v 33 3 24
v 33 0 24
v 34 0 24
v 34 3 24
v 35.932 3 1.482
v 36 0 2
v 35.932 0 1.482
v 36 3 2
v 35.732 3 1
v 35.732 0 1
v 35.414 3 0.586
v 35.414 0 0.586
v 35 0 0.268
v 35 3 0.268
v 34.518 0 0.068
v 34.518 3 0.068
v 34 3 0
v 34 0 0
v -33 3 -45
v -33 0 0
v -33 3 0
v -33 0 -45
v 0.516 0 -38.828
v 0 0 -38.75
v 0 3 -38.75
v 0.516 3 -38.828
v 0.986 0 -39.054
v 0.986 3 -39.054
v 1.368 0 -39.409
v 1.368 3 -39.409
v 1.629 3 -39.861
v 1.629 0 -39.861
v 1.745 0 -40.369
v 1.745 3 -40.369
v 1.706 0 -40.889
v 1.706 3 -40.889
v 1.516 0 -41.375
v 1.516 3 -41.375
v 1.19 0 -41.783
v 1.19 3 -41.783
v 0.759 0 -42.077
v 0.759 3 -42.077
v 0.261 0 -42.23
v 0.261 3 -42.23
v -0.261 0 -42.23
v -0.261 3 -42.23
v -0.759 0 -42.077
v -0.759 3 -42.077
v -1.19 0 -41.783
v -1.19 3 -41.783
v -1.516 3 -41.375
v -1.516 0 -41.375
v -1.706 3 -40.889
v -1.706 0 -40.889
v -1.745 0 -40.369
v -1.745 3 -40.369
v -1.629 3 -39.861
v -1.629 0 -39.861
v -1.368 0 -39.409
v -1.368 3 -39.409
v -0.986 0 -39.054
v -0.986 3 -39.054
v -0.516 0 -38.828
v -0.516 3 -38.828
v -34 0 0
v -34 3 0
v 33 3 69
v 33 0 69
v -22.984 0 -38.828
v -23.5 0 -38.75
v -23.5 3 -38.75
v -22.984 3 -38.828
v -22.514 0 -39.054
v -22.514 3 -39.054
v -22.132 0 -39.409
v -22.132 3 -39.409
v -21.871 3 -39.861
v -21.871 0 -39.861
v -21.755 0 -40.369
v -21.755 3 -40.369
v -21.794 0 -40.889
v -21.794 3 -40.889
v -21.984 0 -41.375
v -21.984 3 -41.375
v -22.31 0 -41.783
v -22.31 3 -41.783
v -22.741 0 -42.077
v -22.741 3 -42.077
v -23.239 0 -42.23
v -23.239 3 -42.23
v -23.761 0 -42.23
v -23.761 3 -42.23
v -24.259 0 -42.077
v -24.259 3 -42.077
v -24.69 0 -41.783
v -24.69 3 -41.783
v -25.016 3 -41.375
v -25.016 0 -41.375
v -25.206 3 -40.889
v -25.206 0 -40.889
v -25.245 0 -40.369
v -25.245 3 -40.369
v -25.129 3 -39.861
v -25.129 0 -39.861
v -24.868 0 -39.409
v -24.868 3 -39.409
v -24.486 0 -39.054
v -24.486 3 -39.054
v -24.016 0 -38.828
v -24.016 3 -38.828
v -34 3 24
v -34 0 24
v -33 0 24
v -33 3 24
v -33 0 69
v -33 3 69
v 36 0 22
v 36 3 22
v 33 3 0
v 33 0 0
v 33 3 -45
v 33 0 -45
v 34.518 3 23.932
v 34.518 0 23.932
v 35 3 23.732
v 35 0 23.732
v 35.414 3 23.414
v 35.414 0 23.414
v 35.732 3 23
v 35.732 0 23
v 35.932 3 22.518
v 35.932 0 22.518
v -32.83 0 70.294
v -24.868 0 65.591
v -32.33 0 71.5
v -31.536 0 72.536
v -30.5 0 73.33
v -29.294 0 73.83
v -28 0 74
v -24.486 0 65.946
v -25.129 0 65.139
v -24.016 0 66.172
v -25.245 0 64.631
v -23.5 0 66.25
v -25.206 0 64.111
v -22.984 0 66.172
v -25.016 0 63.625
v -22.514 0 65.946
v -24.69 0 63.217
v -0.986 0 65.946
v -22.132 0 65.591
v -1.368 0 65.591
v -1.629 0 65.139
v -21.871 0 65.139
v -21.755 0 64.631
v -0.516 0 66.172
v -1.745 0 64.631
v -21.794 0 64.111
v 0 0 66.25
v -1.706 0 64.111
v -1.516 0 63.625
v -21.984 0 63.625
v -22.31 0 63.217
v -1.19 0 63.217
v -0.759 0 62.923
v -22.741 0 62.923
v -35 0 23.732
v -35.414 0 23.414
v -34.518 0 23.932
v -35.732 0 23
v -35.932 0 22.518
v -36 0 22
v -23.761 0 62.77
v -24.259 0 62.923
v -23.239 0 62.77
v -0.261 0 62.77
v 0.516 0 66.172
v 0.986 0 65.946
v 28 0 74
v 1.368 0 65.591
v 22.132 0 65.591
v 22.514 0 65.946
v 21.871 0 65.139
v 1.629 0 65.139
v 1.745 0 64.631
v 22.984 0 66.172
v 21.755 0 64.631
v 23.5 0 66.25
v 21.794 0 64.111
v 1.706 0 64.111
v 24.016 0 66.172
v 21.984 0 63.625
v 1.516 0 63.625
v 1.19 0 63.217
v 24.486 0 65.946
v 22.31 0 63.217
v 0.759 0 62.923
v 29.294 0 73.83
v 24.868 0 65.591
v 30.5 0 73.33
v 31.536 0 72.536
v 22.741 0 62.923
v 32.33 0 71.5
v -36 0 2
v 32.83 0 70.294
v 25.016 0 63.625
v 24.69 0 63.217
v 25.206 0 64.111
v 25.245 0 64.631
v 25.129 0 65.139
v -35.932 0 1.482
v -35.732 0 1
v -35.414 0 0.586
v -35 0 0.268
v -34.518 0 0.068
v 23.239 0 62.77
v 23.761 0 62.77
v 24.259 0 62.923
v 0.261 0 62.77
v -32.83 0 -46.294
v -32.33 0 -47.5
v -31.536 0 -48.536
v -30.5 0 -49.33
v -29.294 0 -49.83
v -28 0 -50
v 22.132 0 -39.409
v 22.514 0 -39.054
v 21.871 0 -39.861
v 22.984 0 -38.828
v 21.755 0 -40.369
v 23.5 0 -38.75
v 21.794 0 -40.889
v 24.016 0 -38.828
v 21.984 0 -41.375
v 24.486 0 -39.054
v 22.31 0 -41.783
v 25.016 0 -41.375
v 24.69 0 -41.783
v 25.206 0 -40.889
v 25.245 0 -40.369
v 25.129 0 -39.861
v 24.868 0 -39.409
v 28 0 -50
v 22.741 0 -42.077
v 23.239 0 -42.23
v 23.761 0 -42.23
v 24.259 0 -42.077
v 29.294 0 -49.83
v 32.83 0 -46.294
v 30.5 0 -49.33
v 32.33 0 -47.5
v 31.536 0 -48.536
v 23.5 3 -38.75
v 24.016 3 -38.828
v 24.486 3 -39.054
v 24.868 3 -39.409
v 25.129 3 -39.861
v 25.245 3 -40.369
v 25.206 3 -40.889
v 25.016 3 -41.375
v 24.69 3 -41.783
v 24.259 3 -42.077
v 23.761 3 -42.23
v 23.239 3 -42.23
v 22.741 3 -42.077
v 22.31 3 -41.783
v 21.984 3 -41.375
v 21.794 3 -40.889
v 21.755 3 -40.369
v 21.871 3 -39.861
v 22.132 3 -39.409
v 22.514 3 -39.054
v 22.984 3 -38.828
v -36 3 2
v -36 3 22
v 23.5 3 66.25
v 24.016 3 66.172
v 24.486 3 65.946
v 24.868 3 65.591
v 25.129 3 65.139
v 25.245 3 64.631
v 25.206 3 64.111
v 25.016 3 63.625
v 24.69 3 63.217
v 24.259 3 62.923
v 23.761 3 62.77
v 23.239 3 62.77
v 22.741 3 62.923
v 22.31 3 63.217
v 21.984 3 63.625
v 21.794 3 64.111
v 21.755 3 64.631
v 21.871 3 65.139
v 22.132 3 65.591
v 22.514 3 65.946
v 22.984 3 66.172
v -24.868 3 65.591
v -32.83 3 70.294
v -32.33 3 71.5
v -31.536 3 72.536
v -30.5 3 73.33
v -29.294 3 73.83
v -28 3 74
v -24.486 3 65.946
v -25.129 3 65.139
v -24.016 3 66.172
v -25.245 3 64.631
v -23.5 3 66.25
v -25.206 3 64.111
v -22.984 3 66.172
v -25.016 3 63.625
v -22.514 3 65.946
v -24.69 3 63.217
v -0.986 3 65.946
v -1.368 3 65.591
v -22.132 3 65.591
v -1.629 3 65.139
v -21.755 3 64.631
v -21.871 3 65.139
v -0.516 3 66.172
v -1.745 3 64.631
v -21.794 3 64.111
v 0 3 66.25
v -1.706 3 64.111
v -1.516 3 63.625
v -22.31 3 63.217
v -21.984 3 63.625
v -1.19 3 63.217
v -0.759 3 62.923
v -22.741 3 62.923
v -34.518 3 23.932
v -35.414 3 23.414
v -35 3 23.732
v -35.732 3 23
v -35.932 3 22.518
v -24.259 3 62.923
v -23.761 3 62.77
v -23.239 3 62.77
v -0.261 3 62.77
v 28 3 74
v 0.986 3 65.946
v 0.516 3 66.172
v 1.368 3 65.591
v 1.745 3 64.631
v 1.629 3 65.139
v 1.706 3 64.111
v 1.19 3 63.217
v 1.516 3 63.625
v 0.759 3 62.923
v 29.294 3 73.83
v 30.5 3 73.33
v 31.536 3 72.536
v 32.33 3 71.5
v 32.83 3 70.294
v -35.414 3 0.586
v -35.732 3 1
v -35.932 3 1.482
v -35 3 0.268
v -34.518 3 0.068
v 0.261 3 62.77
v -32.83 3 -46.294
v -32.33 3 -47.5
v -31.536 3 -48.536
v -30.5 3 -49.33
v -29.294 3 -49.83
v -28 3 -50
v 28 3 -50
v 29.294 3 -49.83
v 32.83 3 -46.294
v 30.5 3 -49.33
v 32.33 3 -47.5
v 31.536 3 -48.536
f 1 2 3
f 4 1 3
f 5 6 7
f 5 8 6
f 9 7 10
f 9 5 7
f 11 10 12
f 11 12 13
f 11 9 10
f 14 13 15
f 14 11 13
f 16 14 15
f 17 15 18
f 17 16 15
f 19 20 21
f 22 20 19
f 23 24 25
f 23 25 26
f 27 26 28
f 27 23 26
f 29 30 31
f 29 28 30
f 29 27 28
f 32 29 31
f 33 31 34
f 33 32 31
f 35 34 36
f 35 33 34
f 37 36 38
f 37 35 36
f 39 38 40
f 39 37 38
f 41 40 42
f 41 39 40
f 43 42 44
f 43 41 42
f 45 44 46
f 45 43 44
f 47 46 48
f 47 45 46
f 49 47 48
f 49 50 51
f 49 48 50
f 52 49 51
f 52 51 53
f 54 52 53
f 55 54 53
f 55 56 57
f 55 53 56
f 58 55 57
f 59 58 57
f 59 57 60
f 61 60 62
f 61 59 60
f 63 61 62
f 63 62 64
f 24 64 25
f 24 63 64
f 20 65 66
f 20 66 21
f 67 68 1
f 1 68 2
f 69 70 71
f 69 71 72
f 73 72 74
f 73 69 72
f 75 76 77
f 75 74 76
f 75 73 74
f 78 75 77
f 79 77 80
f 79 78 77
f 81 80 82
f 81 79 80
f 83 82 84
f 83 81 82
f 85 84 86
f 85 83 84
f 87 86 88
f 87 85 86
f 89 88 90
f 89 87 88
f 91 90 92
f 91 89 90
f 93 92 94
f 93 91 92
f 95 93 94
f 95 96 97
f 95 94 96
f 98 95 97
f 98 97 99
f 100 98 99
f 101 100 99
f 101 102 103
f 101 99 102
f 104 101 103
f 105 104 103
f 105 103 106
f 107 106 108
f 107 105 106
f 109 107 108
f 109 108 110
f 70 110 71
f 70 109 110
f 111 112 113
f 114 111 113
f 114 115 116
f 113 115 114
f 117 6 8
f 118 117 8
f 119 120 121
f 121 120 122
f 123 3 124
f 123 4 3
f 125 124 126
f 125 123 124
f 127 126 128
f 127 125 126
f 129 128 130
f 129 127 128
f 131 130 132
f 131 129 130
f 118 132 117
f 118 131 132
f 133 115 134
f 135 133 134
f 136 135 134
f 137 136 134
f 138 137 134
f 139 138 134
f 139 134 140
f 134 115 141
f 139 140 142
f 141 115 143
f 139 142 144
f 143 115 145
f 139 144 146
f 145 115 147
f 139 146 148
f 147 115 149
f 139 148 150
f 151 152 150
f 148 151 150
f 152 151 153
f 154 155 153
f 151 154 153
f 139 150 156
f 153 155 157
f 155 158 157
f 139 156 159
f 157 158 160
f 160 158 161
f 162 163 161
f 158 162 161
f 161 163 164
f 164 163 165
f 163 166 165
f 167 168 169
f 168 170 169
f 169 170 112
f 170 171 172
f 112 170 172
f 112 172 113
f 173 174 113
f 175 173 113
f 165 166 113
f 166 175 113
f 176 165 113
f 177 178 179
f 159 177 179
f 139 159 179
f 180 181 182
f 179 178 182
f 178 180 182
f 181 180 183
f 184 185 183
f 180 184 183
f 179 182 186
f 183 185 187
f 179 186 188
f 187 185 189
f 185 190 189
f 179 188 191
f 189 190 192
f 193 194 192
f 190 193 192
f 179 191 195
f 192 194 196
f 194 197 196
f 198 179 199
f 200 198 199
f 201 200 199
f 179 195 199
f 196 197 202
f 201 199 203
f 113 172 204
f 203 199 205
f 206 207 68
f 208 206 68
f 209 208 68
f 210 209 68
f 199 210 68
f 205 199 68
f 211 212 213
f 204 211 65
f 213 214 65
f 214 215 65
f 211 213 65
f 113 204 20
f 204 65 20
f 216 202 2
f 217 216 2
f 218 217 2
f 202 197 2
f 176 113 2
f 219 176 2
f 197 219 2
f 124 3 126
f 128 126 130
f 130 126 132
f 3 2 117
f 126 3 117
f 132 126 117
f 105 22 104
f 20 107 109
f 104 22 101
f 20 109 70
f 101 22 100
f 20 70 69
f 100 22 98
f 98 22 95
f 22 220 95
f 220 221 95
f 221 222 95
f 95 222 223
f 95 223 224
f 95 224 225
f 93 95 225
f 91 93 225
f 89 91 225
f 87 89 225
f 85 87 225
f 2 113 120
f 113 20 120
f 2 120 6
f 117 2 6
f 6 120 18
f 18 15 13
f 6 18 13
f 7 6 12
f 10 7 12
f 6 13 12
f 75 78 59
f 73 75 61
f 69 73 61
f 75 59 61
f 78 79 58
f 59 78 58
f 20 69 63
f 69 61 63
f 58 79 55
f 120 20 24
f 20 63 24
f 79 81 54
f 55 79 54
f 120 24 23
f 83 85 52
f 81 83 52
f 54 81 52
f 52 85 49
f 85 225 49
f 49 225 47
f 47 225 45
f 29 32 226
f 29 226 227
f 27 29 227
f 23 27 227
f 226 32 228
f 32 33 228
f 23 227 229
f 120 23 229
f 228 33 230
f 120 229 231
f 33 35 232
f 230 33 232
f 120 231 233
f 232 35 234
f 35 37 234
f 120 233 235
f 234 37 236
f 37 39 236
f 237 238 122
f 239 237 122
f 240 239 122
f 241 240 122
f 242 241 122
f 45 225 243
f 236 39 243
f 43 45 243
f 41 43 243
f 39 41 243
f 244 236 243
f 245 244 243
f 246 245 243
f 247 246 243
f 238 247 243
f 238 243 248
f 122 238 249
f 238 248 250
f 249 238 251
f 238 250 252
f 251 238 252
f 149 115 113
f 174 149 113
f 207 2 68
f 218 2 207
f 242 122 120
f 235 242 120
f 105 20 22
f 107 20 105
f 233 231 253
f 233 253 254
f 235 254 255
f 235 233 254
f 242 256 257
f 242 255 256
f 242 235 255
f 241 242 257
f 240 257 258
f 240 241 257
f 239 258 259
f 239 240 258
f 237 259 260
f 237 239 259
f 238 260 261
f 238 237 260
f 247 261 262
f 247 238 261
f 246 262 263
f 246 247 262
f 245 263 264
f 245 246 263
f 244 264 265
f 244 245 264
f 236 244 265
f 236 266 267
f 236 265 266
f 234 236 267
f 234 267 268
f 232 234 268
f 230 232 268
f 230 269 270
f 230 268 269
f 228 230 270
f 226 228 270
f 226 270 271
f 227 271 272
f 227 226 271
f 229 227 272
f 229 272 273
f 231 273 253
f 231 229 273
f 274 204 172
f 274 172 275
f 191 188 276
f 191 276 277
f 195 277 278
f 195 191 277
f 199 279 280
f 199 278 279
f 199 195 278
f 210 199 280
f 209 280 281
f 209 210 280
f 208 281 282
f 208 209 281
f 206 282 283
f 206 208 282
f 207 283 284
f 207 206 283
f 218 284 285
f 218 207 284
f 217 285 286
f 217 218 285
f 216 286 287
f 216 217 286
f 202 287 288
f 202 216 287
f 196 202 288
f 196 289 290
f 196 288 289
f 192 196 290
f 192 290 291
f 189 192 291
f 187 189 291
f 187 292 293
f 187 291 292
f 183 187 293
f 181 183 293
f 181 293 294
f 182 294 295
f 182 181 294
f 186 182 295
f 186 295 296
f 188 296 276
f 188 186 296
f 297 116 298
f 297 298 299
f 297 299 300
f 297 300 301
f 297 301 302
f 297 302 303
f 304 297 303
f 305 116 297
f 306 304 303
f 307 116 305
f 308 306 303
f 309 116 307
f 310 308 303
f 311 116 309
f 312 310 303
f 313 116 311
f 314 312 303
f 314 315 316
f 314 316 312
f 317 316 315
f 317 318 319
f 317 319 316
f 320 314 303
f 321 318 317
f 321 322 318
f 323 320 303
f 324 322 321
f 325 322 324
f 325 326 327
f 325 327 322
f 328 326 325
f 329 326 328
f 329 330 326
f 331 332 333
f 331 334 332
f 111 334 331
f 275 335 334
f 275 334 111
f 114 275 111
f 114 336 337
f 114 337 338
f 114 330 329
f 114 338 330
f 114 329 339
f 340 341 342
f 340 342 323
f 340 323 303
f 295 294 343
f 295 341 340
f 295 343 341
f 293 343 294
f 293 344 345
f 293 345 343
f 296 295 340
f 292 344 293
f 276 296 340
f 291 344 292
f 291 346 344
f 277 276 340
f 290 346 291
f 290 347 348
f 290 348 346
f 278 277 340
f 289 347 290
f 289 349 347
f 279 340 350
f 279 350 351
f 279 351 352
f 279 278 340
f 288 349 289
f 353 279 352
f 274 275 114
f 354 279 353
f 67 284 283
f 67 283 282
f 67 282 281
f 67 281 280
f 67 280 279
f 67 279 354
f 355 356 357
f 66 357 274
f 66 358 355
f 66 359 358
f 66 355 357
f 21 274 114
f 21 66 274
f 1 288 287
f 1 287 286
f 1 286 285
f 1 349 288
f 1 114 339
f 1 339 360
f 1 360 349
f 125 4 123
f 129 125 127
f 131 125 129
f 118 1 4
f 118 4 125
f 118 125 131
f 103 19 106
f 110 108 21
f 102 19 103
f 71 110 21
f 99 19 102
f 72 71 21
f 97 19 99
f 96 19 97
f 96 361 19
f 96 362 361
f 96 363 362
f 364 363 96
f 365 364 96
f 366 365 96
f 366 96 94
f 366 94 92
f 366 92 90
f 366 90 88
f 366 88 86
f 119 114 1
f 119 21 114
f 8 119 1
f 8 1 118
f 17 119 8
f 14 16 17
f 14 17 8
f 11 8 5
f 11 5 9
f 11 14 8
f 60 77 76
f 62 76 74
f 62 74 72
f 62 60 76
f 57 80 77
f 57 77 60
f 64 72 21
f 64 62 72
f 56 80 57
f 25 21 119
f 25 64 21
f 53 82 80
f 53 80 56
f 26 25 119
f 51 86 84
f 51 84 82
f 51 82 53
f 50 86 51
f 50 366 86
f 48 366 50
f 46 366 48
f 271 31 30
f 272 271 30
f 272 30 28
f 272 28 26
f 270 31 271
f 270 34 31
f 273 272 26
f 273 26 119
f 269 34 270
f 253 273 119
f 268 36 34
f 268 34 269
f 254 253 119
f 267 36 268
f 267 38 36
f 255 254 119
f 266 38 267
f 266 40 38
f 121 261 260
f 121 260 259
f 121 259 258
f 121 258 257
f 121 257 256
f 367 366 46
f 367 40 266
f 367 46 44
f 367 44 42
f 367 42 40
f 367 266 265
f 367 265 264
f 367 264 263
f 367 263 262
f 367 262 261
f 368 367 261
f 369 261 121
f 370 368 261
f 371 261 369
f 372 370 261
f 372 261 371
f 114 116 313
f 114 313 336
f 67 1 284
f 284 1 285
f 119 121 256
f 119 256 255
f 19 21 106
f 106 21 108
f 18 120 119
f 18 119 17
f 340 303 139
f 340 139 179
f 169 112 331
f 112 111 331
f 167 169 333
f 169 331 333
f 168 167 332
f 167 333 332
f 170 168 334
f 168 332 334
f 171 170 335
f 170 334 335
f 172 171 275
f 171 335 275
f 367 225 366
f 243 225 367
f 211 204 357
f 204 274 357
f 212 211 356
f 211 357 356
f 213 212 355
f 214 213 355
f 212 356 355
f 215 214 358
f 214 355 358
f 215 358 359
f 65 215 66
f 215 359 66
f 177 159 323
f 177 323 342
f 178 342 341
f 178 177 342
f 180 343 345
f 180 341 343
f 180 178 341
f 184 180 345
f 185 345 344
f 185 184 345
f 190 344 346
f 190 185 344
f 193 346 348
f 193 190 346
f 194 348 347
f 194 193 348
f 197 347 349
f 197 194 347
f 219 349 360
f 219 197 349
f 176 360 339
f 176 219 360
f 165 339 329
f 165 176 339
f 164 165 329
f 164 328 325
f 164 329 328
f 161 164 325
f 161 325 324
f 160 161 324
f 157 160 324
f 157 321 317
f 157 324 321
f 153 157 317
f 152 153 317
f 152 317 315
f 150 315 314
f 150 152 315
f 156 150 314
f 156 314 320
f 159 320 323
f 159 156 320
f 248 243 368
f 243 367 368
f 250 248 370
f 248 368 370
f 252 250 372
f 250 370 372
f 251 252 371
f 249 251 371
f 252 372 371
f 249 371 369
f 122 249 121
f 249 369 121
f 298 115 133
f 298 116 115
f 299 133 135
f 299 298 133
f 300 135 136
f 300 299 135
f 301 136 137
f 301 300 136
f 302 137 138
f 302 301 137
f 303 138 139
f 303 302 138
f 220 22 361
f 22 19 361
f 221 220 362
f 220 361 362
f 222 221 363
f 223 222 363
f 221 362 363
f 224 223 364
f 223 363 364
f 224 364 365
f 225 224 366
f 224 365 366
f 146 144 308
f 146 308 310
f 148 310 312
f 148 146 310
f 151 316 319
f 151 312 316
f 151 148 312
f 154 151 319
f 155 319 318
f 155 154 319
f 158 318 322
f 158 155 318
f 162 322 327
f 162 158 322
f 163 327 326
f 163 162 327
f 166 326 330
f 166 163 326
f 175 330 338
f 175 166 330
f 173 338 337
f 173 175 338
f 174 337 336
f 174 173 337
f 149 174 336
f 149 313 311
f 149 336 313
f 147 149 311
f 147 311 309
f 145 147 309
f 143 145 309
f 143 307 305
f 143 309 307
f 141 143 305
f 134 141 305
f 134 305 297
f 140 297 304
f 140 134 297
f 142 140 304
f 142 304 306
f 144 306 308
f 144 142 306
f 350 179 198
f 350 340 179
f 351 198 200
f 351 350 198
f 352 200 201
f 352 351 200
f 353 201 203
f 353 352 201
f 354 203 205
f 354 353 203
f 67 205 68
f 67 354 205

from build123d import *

# Parameters (mm, degrees)
SKETCH_1_W               = 72
SKETCH_1_H               = 100
EXTRUDE_1_DEPTH          = 3
SKETCH_2_W               = 72
SKETCH_2_H               = 3
EXTRUDE_2_DEPTH          = 24
CUT_EXTRUDE_1_DEPTH      = 83.346827504
CUT_EXTRUDE_1_DEPTH_BACK = 83.346827504
SKETCH_3_W               = 3
SKETCH_3_H               = 50
CUT_EXTRUDE_2_DEPTH      = 83.346827504
CUT_EXTRUDE_2_DEPTH_BACK = 83.346827504
SKETCH_5_R               = 1.75
CUT_EXTRUDE_3_DEPTH      = 83.346827504
CUT_EXTRUDE_3_DEPTH_BACK = 83.346827504
SKETCH_6_R               = 1.75
FILLET_1_R               = 5
FILLET_2_R               = 2
CUT_EXTRUDE_5_DEPTH      = 83.346827504
CUT_EXTRUDE_5_DEPTH_BACK = 83.346827504
SKETCH_8_R               = 1.75


with BuildPart() as part:
    # 草图1 → 凸台-拉伸1 (new body)
    with BuildSketch(Plane(origin=(0, 0, 0), x_dir=(1, 0, 0), z_dir=(0, 1, 0))):
        Rectangle(SKETCH_1_W, SKETCH_1_H)
    extrude(amount=EXTRUDE_1_DEPTH)

    # 草图2 → 凸台-拉伸2 (add)
    with BuildSketch(Plane.XY.offset(50)):
        with Locations((0, 1.5)):
            Rectangle(SKETCH_2_W, SKETCH_2_H)
    extrude(amount=EXTRUDE_2_DEPTH)

    # 草图3 → 切除-拉伸1 (cut, two sides: drawn at the far end of the back side and taken through both)
    with BuildSketch(Plane(origin=(0, 3, 0), x_dir=(1, 0, 0), z_dir=(0, 1, 0)).offset(-CUT_EXTRUDE_1_DEPTH_BACK)):
        with Locations((-34.5, 25)):
            Rectangle(SKETCH_3_W, SKETCH_3_H)
        with Locations((34.5, 25)):
            Rectangle(SKETCH_3_W, SKETCH_3_H)
        with Locations((-34.5, -49)):
            Rectangle(SKETCH_3_W, SKETCH_3_H)
        with Locations((34.5, -49)):
            Rectangle(SKETCH_3_W, SKETCH_3_H)
    extrude(amount=CUT_EXTRUDE_1_DEPTH + CUT_EXTRUDE_1_DEPTH_BACK, mode=Mode.SUBTRACT)

    # 草图5 → 切除-拉伸2 (cut, two sides: drawn at the far end of the back side and taken through both)
    with BuildSketch(Plane(origin=(0, 3, 0), x_dir=(1, 0, 0), z_dir=(0, 1, 0)).offset(-CUT_EXTRUDE_2_DEPTH_BACK)):
        with Locations(Location((-23.5, 40.5, 0), (0, 0, 270))):
            Circle(SKETCH_5_R)
    extrude(amount=CUT_EXTRUDE_2_DEPTH + CUT_EXTRUDE_2_DEPTH_BACK, mode=Mode.SUBTRACT)

    # 草图6 → 切除-拉伸3 (cut, two sides: drawn at the far end of the back side and taken through both)
    with BuildSketch(Plane(origin=(0, 3, 0), x_dir=(1, 0, 0), z_dir=(0, 1, 0)).offset(-CUT_EXTRUDE_3_DEPTH_BACK)):
        with Locations(Location((23.5, 40.5, 0), (0, 0, 270))):
            Circle(SKETCH_6_R)
        with Locations(Location((-23.5, -64.5, 0), (0, 0, 270))):
            Circle(SKETCH_6_R)
        with Locations(Location((23.5, -64.5, 0), (0, 0, 270))):
            Circle(SKETCH_6_R)
    extrude(amount=CUT_EXTRUDE_3_DEPTH + CUT_EXTRUDE_3_DEPTH_BACK, mode=Mode.SUBTRACT)

    # 圆角1
    fillet_1_edges = [part.edges().sort_by_distance(p)[0] for p in [
        (33, 1.5, -50),
        (-33, 1.5, 74),
        (33, 1.5, 74),
        (-33, 1.5, -50),
    ]]
    fillet(fillet_1_edges, radius=FILLET_1_R)

    # 圆角2
    fillet_2_edges = [part.edges().sort_by_distance(p)[0] for p in [
        (36, 1.5, 0),
        (-36, 1.5, 24),
        (36, 1.5, 24),
        (-36, 1.5, 0),
    ]]
    fillet(fillet_2_edges, radius=FILLET_2_R)

    # 草图8 → 切除-拉伸5 (cut, two sides: drawn at the far end of the back side and taken through both)
    with BuildSketch(Plane(origin=(0, 3, 0), x_dir=(1, 0, 0), z_dir=(0, 1, 0)).offset(-CUT_EXTRUDE_5_DEPTH_BACK)):
        with Locations(Location((0, 40.5, 0), (0, 0, 270))):
            Circle(SKETCH_8_R)
        with Locations(Location((0, -64.5, 0), (0, 0, 270))):
            Circle(SKETCH_8_R)
    extrude(amount=CUT_EXTRUDE_5_DEPTH + CUT_EXTRUDE_5_DEPTH_BACK, mode=Mode.SUBTRACT)


solid = part.part
